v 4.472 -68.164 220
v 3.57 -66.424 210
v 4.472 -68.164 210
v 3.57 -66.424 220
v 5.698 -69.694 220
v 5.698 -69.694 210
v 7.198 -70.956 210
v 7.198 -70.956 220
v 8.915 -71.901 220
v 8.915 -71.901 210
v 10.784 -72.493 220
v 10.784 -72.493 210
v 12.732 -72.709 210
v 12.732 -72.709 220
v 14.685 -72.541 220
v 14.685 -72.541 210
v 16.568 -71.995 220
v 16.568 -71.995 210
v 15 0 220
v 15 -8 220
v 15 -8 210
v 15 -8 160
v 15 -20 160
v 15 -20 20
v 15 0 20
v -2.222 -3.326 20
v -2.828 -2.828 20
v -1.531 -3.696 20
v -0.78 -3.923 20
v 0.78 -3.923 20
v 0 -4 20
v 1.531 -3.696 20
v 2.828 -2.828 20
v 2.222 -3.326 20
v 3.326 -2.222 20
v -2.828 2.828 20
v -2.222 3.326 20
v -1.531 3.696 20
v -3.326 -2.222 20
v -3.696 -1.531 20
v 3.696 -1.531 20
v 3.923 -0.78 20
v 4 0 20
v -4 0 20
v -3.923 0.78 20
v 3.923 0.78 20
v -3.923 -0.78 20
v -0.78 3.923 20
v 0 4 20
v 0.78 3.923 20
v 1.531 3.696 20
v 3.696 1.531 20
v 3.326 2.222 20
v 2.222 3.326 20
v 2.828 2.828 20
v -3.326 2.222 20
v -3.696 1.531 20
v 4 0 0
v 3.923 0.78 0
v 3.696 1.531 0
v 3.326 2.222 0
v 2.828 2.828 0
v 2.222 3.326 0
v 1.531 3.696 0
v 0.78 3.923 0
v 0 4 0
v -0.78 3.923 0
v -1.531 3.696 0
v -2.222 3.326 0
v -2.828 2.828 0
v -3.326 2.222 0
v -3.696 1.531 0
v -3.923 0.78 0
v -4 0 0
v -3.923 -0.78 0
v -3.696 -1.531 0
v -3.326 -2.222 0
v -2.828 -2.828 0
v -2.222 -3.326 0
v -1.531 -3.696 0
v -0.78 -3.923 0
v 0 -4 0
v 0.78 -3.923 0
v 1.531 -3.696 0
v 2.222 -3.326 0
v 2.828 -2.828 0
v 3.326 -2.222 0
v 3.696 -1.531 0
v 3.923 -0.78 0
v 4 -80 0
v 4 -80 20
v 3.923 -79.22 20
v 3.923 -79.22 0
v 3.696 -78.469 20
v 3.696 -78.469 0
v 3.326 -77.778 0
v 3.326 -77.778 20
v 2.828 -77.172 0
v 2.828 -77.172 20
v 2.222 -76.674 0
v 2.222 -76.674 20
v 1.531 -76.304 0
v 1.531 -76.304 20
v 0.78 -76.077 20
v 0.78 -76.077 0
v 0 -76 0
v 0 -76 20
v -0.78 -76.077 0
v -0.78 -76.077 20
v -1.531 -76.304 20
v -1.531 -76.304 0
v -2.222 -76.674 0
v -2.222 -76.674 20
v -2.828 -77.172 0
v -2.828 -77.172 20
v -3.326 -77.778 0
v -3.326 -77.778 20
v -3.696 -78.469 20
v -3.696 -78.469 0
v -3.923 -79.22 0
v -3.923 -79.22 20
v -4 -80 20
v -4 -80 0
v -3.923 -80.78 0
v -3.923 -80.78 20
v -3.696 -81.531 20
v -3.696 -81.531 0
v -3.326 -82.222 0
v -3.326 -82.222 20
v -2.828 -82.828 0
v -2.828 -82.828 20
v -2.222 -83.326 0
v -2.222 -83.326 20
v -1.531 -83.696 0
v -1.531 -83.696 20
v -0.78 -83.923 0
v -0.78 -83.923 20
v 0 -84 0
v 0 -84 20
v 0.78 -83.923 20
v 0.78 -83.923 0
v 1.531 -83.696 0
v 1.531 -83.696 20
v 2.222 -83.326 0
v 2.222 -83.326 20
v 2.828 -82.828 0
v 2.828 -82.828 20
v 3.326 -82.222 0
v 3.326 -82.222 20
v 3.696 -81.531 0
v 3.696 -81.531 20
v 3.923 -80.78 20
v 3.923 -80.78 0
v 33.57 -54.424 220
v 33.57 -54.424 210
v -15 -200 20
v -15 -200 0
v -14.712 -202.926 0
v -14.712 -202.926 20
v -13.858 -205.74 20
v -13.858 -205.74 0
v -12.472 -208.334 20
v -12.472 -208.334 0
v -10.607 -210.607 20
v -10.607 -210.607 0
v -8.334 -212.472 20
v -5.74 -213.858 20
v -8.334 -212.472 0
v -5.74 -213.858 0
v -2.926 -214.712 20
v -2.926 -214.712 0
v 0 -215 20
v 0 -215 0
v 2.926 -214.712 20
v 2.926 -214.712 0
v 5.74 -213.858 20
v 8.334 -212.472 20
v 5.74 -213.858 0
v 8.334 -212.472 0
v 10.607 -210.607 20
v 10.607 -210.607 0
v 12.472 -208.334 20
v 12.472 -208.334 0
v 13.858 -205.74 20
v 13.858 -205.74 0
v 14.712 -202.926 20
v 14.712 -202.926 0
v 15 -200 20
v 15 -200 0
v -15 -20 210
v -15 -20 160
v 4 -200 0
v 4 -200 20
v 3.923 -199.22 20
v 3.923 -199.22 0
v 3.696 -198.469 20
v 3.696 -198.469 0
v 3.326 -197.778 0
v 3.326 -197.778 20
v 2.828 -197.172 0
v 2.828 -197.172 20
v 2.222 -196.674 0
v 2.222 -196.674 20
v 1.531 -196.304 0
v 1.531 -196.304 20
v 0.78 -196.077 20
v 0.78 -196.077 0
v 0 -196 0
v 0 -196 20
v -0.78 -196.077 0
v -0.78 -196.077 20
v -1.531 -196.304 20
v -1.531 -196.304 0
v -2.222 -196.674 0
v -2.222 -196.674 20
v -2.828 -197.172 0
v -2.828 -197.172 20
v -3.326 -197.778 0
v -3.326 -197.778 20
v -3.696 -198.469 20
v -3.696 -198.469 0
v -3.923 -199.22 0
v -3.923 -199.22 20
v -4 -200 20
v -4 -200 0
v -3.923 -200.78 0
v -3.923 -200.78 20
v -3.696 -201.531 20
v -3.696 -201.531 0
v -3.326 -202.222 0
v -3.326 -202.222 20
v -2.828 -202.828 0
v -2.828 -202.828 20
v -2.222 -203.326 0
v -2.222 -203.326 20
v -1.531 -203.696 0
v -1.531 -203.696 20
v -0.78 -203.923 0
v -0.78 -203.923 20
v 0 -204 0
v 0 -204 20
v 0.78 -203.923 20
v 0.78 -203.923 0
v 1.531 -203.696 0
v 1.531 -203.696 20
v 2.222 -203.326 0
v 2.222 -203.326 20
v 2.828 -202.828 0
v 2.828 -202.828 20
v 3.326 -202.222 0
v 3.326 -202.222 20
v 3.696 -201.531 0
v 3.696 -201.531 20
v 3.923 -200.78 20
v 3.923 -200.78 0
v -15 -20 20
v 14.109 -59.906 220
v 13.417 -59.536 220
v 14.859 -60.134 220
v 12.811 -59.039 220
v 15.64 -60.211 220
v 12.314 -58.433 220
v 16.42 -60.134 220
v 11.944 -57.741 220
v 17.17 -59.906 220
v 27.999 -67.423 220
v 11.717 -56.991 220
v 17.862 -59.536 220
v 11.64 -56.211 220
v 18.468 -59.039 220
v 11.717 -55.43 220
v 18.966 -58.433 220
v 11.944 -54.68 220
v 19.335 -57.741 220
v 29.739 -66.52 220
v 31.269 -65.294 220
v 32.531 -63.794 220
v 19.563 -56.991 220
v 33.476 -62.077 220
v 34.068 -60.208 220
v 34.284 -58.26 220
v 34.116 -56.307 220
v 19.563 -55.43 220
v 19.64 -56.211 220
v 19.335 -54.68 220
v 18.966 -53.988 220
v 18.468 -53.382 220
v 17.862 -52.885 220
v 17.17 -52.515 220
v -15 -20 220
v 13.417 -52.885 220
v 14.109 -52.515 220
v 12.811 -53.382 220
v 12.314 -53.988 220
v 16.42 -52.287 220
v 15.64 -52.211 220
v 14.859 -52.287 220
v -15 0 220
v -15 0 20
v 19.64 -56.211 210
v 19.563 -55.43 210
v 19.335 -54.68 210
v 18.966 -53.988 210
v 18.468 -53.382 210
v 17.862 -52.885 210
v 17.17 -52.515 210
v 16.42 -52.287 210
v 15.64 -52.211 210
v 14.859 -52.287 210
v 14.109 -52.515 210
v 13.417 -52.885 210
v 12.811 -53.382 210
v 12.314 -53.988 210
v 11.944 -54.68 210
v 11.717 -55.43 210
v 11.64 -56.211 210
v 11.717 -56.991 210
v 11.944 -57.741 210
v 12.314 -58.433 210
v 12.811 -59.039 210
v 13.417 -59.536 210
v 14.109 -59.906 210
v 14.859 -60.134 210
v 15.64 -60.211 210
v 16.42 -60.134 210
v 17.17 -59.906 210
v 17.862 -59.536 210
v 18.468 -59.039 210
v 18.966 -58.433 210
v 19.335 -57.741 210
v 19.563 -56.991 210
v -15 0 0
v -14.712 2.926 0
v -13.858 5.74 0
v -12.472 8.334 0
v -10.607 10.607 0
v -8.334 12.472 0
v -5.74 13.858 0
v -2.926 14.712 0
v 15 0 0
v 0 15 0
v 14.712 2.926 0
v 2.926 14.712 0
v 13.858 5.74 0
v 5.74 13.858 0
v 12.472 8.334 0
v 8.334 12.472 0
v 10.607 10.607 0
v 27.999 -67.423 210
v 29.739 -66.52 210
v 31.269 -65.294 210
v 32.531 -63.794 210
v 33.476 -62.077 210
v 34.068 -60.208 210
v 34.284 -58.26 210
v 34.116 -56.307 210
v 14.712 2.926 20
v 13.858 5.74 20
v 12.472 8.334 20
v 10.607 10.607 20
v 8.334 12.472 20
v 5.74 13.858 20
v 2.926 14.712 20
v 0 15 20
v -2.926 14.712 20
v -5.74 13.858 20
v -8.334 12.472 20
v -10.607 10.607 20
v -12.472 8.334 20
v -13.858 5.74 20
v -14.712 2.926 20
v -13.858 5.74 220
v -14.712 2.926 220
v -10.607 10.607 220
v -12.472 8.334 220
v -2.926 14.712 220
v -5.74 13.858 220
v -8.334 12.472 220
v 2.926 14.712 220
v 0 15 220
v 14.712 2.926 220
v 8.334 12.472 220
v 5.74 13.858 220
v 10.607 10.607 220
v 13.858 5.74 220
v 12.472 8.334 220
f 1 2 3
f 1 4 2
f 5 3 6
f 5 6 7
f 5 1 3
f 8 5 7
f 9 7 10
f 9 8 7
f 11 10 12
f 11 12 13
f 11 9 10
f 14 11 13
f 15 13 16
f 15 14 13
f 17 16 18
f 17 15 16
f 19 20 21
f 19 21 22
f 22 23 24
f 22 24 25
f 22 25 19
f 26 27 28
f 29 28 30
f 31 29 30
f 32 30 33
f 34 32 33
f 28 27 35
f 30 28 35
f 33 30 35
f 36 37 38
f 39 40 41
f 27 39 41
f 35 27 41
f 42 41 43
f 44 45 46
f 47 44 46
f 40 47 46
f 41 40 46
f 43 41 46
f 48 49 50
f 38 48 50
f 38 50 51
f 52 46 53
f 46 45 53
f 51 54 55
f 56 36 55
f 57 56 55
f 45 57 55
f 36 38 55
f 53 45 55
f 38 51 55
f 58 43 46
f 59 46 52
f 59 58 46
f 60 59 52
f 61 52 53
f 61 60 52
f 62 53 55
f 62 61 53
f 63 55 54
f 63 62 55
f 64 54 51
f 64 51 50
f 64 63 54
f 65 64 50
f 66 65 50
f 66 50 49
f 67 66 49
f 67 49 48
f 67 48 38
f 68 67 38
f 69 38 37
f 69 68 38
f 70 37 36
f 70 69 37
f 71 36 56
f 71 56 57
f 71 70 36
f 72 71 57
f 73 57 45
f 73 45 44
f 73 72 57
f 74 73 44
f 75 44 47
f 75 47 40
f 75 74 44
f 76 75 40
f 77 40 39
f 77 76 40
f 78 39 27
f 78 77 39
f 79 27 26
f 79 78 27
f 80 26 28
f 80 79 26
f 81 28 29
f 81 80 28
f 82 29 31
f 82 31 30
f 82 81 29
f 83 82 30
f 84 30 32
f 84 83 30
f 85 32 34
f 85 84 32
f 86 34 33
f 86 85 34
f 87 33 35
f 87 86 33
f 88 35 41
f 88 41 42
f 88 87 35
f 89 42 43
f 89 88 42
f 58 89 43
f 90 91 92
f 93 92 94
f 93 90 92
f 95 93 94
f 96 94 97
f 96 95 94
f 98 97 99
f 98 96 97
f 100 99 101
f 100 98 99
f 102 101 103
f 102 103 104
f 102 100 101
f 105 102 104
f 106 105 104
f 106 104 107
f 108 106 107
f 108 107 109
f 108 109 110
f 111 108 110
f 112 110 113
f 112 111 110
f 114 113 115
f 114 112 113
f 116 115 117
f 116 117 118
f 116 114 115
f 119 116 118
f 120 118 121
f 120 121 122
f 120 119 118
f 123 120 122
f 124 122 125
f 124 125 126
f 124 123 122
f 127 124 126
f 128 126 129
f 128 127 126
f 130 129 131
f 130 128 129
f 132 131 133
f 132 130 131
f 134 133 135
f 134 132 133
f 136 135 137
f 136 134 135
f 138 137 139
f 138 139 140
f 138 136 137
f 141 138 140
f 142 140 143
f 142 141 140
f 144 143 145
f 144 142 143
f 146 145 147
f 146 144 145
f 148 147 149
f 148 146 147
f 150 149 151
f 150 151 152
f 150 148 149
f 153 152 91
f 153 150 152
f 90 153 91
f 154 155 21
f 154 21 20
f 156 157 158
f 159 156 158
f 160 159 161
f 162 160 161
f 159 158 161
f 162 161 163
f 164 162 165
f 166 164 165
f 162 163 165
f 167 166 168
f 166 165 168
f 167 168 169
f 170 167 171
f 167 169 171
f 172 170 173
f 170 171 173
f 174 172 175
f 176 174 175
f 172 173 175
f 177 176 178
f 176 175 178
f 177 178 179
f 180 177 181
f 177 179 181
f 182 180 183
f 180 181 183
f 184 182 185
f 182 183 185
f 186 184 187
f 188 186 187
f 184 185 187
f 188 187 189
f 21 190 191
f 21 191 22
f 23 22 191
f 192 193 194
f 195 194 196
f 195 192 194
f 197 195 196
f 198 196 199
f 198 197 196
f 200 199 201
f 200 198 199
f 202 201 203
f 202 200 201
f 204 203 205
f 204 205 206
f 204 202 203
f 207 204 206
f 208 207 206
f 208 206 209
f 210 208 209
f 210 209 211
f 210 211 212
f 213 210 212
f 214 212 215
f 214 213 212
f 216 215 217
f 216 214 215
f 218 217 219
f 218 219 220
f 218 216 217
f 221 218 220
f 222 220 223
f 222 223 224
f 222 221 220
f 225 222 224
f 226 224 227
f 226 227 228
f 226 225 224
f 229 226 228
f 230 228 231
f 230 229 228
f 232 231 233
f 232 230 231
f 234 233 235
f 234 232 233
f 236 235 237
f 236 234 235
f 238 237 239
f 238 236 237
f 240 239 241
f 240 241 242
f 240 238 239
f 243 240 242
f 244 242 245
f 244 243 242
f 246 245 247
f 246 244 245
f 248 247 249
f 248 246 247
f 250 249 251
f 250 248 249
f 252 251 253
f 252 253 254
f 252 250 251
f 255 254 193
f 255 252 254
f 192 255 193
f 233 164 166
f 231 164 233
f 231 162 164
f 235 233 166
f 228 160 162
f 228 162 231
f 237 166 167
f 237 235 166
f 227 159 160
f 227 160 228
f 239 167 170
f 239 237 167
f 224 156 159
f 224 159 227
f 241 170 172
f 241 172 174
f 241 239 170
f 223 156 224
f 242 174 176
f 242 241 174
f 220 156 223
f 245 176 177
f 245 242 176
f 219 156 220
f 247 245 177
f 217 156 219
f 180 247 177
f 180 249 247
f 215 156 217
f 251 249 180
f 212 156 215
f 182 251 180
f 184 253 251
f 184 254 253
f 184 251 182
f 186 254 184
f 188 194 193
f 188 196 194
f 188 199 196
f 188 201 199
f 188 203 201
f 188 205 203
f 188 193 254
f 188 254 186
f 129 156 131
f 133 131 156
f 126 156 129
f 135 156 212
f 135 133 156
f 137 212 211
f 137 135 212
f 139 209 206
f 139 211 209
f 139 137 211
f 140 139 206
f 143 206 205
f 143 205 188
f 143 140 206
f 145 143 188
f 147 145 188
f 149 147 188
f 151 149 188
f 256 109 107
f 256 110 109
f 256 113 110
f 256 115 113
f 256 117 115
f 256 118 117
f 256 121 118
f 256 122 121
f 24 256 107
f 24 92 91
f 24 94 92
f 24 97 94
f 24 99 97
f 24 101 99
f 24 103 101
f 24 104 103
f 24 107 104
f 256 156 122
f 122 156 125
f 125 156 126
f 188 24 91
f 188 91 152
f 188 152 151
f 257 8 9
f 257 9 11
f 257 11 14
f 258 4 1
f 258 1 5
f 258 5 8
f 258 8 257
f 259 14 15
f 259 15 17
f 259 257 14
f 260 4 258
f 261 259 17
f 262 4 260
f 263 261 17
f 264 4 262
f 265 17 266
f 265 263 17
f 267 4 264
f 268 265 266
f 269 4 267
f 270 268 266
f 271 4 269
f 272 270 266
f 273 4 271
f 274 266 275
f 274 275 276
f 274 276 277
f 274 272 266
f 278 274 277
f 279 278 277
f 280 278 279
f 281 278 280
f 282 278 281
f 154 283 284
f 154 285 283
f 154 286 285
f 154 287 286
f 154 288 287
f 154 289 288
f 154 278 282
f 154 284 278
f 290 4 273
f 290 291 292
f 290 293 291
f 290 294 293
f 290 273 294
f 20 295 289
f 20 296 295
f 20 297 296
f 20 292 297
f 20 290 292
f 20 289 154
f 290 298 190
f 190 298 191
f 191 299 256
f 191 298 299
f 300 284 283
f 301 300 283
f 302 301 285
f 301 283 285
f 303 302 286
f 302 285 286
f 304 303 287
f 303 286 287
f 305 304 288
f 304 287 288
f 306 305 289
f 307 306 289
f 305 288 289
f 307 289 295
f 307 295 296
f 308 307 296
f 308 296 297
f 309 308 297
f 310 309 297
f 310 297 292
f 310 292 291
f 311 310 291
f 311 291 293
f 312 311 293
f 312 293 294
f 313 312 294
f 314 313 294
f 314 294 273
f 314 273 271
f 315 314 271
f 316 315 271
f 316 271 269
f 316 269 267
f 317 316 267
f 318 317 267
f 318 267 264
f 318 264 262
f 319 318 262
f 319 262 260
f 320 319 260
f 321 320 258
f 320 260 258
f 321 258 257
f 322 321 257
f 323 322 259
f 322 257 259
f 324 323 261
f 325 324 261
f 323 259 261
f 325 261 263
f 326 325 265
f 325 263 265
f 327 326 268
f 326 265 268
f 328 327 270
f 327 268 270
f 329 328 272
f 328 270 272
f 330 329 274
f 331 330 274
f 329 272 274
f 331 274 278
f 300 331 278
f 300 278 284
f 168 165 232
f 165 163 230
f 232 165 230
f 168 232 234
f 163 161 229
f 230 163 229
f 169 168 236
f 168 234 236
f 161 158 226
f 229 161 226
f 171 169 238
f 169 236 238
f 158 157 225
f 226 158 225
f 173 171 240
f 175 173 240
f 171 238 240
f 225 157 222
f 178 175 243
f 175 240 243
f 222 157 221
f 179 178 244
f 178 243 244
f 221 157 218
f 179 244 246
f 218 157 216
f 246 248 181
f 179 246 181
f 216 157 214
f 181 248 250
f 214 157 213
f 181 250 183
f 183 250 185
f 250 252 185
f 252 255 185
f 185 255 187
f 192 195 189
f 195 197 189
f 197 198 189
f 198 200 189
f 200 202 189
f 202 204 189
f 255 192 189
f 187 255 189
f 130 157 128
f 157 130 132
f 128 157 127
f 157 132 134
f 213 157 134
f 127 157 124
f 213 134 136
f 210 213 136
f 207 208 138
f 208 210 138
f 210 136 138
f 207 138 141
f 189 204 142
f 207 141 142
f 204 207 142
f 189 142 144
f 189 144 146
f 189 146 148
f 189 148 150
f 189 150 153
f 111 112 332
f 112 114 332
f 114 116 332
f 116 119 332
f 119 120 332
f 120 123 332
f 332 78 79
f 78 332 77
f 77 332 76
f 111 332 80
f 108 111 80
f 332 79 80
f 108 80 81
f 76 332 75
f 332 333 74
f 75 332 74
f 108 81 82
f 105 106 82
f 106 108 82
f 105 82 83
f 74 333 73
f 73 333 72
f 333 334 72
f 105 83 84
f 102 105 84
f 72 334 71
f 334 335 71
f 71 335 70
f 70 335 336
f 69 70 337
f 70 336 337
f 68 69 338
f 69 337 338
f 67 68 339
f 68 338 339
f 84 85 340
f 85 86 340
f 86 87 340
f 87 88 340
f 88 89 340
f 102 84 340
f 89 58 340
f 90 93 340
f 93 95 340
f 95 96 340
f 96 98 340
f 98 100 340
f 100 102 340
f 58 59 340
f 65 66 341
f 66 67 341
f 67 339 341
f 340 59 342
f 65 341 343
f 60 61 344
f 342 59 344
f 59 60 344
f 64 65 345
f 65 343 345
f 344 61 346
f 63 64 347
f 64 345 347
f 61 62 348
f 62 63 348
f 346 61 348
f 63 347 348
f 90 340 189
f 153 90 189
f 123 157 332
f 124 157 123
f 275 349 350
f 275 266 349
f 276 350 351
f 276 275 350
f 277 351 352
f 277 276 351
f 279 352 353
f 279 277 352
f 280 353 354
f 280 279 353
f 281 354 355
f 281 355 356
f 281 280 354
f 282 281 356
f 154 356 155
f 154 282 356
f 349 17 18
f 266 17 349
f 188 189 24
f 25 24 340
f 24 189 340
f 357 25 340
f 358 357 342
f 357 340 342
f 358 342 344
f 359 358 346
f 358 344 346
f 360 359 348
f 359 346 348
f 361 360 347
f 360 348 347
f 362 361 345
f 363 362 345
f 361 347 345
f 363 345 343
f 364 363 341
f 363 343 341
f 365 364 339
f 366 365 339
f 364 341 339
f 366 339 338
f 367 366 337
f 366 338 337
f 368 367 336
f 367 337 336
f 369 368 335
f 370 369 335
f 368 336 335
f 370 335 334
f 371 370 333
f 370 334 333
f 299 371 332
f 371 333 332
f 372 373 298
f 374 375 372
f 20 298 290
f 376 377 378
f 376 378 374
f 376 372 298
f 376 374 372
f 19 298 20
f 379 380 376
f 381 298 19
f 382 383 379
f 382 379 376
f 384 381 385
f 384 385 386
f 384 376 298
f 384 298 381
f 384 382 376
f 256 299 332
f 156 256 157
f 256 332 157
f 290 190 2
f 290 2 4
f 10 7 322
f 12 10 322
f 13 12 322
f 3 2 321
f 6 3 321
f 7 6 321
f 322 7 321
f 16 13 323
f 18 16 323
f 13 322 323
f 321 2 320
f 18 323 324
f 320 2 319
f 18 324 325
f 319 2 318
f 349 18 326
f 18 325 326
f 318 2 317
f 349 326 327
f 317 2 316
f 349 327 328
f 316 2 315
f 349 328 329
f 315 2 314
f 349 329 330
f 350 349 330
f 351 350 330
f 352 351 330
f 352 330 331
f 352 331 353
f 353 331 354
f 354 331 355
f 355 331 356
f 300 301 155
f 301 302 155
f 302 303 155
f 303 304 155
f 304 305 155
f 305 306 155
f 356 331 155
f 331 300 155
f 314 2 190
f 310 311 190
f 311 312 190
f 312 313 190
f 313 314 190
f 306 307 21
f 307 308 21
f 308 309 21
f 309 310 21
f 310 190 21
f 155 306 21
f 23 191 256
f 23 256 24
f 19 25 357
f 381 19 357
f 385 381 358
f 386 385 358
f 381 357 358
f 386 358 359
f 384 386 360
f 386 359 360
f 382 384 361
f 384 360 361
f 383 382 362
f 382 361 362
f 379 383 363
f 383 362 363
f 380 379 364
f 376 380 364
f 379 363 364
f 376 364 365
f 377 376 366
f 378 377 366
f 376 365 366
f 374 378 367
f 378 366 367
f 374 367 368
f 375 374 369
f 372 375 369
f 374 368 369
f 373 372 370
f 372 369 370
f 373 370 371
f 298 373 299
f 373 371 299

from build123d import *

# Parameters (mm, degrees)
ESQUISSE1_R             = 15
ESQUISSE1_R_2           = 4
BOSS_EXTRU_1_DEPTH      = 20
BOSS_EXTRU_2_DEPTH      = 200
ENL_V_MAT_EXTRU_2_DEPTH = 60
ESQUISSE3_W             = 32.310988843
ESQUISSE3_H             = 10
BOSS_EXTRU_3_DEPTH      = 60
CONG_2_R                = 10
ENL_V_MAT_EXTRU_1_REACH = 311.516
ESQUISSE4_R             = 4


with BuildPart() as part:
    # Esquisse1 → Boss.-Extru.1 (new body)
    # profile 1 of 5: a face of its own
    with BuildSketch(Plane.XY):
        Circle(ESQUISSE1_R)
        Circle(ESQUISSE1_R_2, mode=Mode.SUBTRACT)
    # profile 2 of 5: a face of its own
    with BuildSketch(Plane.XY):
        with Locations((0, -80)):
            Circle(ESQUISSE1_R)
        with Locations((0, -80)):
            Circle(ESQUISSE1_R_2, mode=Mode.SUBTRACT)
    # profile 3 of 5: a face of its own
    with BuildSketch(Plane.XY):
        with BuildLine():
            ThreePointArc((15, 0), (0, -15), (-15, 0))
            Line((-15, 0), (-15, -80.000000008))
            ThreePointArc((-15, -80.000000008), (-4e-09, -65), (15, -80))
            Line((15, -80), (15, 0))
        make_face()
    # profile 4 of 5: a face of its own
    with BuildSketch(Plane.XY):
        with BuildLine():
            ThreePointArc((15, -80), (4e-09, -95), (-15, -80.000000008))
            Line((-15, -80.000000008), (-15, -200))
            ThreePointArc((-15, -200), (0, -185), (15, -200))
            Line((15, -200), (15, -80))
        make_face()
    # profile 5 of 5: a face of its own
    with BuildSketch(Plane.XY):
        with Locations((0, -200)):
            Circle(ESQUISSE1_R)
        with Locations((0, -200)):
            Circle(ESQUISSE1_R_2, mode=Mode.SUBTRACT)
    extrude(amount=BOSS_EXTRU_1_DEPTH)

    # Esquisse2 → Boss.-Extru.2 (add)
    with BuildSketch(Plane.XY.offset(20)):
        with BuildLine():
            Line((-15, 0), (-15, -20))
            Line((-15, -20), (15, -20))
            Line((15, -20), (15, 0))
            ThreePointArc((15, 0), (0, 15), (-15, 0))
        make_face()
    extrude(amount=BOSS_EXTRU_2_DEPTH)

    # Esquisse5 → Enlèv. mat.-Extru.2 (cut)
    with BuildSketch(Plane.XY.offset(220)):
        Polygon((-15, -20), (15, -8), (15, -20), align=None)
    extrude(amount=-ENL_V_MAT_EXTRU_2_DEPTH, mode=Mode.SUBTRACT)

    # Esquisse3 → Boss.-Extru.3 (add)
    with BuildSketch(Plane(origin=(-1.072849637, -14.429139855, 0), x_dir=(0.9284766908852593, 0.3713906763541038, 0), z_dir=(0.3713906763541038, -0.9284766908852594, 0))):
        with Locations((1.155494421, 215)):
            Rectangle(ESQUISSE3_W, ESQUISSE3_H)
    extrude(amount=BOSS_EXTRU_3_DEPTH)

    # Congé2
    cong_2_edges = [part.edges().sort_by_distance(p)[0] for p in [
        (7.283440581, -75.708601453, 215),
        (37.283440581, -63.708601453, 215),
    ]]
    fillet(cong_2_edges, radius=CONG_2_R)

    # Esquisse4 → Enlèv. mat.-Extru.1 (cut, up to next)
    with BuildSketch(Plane.XY.offset(220), mode=Mode.PRIVATE) as enl_v_mat_extru_1_sk1:
        with Locations((15.639730799, -56.210590945)):
            Circle(ESQUISSE4_R)
    enl_v_mat_extru_1_tool1 = extrude(enl_v_mat_extru_1_sk1.sketch, amount=-ENL_V_MAT_EXTRU_1_REACH, mode=Mode.PRIVATE) & part.part
    add(enl_v_mat_extru_1_tool1.solids().sort_by_distance((15.639731, -56.210591, 220))[0], mode=Mode.SUBTRACT)


solid = part.part
